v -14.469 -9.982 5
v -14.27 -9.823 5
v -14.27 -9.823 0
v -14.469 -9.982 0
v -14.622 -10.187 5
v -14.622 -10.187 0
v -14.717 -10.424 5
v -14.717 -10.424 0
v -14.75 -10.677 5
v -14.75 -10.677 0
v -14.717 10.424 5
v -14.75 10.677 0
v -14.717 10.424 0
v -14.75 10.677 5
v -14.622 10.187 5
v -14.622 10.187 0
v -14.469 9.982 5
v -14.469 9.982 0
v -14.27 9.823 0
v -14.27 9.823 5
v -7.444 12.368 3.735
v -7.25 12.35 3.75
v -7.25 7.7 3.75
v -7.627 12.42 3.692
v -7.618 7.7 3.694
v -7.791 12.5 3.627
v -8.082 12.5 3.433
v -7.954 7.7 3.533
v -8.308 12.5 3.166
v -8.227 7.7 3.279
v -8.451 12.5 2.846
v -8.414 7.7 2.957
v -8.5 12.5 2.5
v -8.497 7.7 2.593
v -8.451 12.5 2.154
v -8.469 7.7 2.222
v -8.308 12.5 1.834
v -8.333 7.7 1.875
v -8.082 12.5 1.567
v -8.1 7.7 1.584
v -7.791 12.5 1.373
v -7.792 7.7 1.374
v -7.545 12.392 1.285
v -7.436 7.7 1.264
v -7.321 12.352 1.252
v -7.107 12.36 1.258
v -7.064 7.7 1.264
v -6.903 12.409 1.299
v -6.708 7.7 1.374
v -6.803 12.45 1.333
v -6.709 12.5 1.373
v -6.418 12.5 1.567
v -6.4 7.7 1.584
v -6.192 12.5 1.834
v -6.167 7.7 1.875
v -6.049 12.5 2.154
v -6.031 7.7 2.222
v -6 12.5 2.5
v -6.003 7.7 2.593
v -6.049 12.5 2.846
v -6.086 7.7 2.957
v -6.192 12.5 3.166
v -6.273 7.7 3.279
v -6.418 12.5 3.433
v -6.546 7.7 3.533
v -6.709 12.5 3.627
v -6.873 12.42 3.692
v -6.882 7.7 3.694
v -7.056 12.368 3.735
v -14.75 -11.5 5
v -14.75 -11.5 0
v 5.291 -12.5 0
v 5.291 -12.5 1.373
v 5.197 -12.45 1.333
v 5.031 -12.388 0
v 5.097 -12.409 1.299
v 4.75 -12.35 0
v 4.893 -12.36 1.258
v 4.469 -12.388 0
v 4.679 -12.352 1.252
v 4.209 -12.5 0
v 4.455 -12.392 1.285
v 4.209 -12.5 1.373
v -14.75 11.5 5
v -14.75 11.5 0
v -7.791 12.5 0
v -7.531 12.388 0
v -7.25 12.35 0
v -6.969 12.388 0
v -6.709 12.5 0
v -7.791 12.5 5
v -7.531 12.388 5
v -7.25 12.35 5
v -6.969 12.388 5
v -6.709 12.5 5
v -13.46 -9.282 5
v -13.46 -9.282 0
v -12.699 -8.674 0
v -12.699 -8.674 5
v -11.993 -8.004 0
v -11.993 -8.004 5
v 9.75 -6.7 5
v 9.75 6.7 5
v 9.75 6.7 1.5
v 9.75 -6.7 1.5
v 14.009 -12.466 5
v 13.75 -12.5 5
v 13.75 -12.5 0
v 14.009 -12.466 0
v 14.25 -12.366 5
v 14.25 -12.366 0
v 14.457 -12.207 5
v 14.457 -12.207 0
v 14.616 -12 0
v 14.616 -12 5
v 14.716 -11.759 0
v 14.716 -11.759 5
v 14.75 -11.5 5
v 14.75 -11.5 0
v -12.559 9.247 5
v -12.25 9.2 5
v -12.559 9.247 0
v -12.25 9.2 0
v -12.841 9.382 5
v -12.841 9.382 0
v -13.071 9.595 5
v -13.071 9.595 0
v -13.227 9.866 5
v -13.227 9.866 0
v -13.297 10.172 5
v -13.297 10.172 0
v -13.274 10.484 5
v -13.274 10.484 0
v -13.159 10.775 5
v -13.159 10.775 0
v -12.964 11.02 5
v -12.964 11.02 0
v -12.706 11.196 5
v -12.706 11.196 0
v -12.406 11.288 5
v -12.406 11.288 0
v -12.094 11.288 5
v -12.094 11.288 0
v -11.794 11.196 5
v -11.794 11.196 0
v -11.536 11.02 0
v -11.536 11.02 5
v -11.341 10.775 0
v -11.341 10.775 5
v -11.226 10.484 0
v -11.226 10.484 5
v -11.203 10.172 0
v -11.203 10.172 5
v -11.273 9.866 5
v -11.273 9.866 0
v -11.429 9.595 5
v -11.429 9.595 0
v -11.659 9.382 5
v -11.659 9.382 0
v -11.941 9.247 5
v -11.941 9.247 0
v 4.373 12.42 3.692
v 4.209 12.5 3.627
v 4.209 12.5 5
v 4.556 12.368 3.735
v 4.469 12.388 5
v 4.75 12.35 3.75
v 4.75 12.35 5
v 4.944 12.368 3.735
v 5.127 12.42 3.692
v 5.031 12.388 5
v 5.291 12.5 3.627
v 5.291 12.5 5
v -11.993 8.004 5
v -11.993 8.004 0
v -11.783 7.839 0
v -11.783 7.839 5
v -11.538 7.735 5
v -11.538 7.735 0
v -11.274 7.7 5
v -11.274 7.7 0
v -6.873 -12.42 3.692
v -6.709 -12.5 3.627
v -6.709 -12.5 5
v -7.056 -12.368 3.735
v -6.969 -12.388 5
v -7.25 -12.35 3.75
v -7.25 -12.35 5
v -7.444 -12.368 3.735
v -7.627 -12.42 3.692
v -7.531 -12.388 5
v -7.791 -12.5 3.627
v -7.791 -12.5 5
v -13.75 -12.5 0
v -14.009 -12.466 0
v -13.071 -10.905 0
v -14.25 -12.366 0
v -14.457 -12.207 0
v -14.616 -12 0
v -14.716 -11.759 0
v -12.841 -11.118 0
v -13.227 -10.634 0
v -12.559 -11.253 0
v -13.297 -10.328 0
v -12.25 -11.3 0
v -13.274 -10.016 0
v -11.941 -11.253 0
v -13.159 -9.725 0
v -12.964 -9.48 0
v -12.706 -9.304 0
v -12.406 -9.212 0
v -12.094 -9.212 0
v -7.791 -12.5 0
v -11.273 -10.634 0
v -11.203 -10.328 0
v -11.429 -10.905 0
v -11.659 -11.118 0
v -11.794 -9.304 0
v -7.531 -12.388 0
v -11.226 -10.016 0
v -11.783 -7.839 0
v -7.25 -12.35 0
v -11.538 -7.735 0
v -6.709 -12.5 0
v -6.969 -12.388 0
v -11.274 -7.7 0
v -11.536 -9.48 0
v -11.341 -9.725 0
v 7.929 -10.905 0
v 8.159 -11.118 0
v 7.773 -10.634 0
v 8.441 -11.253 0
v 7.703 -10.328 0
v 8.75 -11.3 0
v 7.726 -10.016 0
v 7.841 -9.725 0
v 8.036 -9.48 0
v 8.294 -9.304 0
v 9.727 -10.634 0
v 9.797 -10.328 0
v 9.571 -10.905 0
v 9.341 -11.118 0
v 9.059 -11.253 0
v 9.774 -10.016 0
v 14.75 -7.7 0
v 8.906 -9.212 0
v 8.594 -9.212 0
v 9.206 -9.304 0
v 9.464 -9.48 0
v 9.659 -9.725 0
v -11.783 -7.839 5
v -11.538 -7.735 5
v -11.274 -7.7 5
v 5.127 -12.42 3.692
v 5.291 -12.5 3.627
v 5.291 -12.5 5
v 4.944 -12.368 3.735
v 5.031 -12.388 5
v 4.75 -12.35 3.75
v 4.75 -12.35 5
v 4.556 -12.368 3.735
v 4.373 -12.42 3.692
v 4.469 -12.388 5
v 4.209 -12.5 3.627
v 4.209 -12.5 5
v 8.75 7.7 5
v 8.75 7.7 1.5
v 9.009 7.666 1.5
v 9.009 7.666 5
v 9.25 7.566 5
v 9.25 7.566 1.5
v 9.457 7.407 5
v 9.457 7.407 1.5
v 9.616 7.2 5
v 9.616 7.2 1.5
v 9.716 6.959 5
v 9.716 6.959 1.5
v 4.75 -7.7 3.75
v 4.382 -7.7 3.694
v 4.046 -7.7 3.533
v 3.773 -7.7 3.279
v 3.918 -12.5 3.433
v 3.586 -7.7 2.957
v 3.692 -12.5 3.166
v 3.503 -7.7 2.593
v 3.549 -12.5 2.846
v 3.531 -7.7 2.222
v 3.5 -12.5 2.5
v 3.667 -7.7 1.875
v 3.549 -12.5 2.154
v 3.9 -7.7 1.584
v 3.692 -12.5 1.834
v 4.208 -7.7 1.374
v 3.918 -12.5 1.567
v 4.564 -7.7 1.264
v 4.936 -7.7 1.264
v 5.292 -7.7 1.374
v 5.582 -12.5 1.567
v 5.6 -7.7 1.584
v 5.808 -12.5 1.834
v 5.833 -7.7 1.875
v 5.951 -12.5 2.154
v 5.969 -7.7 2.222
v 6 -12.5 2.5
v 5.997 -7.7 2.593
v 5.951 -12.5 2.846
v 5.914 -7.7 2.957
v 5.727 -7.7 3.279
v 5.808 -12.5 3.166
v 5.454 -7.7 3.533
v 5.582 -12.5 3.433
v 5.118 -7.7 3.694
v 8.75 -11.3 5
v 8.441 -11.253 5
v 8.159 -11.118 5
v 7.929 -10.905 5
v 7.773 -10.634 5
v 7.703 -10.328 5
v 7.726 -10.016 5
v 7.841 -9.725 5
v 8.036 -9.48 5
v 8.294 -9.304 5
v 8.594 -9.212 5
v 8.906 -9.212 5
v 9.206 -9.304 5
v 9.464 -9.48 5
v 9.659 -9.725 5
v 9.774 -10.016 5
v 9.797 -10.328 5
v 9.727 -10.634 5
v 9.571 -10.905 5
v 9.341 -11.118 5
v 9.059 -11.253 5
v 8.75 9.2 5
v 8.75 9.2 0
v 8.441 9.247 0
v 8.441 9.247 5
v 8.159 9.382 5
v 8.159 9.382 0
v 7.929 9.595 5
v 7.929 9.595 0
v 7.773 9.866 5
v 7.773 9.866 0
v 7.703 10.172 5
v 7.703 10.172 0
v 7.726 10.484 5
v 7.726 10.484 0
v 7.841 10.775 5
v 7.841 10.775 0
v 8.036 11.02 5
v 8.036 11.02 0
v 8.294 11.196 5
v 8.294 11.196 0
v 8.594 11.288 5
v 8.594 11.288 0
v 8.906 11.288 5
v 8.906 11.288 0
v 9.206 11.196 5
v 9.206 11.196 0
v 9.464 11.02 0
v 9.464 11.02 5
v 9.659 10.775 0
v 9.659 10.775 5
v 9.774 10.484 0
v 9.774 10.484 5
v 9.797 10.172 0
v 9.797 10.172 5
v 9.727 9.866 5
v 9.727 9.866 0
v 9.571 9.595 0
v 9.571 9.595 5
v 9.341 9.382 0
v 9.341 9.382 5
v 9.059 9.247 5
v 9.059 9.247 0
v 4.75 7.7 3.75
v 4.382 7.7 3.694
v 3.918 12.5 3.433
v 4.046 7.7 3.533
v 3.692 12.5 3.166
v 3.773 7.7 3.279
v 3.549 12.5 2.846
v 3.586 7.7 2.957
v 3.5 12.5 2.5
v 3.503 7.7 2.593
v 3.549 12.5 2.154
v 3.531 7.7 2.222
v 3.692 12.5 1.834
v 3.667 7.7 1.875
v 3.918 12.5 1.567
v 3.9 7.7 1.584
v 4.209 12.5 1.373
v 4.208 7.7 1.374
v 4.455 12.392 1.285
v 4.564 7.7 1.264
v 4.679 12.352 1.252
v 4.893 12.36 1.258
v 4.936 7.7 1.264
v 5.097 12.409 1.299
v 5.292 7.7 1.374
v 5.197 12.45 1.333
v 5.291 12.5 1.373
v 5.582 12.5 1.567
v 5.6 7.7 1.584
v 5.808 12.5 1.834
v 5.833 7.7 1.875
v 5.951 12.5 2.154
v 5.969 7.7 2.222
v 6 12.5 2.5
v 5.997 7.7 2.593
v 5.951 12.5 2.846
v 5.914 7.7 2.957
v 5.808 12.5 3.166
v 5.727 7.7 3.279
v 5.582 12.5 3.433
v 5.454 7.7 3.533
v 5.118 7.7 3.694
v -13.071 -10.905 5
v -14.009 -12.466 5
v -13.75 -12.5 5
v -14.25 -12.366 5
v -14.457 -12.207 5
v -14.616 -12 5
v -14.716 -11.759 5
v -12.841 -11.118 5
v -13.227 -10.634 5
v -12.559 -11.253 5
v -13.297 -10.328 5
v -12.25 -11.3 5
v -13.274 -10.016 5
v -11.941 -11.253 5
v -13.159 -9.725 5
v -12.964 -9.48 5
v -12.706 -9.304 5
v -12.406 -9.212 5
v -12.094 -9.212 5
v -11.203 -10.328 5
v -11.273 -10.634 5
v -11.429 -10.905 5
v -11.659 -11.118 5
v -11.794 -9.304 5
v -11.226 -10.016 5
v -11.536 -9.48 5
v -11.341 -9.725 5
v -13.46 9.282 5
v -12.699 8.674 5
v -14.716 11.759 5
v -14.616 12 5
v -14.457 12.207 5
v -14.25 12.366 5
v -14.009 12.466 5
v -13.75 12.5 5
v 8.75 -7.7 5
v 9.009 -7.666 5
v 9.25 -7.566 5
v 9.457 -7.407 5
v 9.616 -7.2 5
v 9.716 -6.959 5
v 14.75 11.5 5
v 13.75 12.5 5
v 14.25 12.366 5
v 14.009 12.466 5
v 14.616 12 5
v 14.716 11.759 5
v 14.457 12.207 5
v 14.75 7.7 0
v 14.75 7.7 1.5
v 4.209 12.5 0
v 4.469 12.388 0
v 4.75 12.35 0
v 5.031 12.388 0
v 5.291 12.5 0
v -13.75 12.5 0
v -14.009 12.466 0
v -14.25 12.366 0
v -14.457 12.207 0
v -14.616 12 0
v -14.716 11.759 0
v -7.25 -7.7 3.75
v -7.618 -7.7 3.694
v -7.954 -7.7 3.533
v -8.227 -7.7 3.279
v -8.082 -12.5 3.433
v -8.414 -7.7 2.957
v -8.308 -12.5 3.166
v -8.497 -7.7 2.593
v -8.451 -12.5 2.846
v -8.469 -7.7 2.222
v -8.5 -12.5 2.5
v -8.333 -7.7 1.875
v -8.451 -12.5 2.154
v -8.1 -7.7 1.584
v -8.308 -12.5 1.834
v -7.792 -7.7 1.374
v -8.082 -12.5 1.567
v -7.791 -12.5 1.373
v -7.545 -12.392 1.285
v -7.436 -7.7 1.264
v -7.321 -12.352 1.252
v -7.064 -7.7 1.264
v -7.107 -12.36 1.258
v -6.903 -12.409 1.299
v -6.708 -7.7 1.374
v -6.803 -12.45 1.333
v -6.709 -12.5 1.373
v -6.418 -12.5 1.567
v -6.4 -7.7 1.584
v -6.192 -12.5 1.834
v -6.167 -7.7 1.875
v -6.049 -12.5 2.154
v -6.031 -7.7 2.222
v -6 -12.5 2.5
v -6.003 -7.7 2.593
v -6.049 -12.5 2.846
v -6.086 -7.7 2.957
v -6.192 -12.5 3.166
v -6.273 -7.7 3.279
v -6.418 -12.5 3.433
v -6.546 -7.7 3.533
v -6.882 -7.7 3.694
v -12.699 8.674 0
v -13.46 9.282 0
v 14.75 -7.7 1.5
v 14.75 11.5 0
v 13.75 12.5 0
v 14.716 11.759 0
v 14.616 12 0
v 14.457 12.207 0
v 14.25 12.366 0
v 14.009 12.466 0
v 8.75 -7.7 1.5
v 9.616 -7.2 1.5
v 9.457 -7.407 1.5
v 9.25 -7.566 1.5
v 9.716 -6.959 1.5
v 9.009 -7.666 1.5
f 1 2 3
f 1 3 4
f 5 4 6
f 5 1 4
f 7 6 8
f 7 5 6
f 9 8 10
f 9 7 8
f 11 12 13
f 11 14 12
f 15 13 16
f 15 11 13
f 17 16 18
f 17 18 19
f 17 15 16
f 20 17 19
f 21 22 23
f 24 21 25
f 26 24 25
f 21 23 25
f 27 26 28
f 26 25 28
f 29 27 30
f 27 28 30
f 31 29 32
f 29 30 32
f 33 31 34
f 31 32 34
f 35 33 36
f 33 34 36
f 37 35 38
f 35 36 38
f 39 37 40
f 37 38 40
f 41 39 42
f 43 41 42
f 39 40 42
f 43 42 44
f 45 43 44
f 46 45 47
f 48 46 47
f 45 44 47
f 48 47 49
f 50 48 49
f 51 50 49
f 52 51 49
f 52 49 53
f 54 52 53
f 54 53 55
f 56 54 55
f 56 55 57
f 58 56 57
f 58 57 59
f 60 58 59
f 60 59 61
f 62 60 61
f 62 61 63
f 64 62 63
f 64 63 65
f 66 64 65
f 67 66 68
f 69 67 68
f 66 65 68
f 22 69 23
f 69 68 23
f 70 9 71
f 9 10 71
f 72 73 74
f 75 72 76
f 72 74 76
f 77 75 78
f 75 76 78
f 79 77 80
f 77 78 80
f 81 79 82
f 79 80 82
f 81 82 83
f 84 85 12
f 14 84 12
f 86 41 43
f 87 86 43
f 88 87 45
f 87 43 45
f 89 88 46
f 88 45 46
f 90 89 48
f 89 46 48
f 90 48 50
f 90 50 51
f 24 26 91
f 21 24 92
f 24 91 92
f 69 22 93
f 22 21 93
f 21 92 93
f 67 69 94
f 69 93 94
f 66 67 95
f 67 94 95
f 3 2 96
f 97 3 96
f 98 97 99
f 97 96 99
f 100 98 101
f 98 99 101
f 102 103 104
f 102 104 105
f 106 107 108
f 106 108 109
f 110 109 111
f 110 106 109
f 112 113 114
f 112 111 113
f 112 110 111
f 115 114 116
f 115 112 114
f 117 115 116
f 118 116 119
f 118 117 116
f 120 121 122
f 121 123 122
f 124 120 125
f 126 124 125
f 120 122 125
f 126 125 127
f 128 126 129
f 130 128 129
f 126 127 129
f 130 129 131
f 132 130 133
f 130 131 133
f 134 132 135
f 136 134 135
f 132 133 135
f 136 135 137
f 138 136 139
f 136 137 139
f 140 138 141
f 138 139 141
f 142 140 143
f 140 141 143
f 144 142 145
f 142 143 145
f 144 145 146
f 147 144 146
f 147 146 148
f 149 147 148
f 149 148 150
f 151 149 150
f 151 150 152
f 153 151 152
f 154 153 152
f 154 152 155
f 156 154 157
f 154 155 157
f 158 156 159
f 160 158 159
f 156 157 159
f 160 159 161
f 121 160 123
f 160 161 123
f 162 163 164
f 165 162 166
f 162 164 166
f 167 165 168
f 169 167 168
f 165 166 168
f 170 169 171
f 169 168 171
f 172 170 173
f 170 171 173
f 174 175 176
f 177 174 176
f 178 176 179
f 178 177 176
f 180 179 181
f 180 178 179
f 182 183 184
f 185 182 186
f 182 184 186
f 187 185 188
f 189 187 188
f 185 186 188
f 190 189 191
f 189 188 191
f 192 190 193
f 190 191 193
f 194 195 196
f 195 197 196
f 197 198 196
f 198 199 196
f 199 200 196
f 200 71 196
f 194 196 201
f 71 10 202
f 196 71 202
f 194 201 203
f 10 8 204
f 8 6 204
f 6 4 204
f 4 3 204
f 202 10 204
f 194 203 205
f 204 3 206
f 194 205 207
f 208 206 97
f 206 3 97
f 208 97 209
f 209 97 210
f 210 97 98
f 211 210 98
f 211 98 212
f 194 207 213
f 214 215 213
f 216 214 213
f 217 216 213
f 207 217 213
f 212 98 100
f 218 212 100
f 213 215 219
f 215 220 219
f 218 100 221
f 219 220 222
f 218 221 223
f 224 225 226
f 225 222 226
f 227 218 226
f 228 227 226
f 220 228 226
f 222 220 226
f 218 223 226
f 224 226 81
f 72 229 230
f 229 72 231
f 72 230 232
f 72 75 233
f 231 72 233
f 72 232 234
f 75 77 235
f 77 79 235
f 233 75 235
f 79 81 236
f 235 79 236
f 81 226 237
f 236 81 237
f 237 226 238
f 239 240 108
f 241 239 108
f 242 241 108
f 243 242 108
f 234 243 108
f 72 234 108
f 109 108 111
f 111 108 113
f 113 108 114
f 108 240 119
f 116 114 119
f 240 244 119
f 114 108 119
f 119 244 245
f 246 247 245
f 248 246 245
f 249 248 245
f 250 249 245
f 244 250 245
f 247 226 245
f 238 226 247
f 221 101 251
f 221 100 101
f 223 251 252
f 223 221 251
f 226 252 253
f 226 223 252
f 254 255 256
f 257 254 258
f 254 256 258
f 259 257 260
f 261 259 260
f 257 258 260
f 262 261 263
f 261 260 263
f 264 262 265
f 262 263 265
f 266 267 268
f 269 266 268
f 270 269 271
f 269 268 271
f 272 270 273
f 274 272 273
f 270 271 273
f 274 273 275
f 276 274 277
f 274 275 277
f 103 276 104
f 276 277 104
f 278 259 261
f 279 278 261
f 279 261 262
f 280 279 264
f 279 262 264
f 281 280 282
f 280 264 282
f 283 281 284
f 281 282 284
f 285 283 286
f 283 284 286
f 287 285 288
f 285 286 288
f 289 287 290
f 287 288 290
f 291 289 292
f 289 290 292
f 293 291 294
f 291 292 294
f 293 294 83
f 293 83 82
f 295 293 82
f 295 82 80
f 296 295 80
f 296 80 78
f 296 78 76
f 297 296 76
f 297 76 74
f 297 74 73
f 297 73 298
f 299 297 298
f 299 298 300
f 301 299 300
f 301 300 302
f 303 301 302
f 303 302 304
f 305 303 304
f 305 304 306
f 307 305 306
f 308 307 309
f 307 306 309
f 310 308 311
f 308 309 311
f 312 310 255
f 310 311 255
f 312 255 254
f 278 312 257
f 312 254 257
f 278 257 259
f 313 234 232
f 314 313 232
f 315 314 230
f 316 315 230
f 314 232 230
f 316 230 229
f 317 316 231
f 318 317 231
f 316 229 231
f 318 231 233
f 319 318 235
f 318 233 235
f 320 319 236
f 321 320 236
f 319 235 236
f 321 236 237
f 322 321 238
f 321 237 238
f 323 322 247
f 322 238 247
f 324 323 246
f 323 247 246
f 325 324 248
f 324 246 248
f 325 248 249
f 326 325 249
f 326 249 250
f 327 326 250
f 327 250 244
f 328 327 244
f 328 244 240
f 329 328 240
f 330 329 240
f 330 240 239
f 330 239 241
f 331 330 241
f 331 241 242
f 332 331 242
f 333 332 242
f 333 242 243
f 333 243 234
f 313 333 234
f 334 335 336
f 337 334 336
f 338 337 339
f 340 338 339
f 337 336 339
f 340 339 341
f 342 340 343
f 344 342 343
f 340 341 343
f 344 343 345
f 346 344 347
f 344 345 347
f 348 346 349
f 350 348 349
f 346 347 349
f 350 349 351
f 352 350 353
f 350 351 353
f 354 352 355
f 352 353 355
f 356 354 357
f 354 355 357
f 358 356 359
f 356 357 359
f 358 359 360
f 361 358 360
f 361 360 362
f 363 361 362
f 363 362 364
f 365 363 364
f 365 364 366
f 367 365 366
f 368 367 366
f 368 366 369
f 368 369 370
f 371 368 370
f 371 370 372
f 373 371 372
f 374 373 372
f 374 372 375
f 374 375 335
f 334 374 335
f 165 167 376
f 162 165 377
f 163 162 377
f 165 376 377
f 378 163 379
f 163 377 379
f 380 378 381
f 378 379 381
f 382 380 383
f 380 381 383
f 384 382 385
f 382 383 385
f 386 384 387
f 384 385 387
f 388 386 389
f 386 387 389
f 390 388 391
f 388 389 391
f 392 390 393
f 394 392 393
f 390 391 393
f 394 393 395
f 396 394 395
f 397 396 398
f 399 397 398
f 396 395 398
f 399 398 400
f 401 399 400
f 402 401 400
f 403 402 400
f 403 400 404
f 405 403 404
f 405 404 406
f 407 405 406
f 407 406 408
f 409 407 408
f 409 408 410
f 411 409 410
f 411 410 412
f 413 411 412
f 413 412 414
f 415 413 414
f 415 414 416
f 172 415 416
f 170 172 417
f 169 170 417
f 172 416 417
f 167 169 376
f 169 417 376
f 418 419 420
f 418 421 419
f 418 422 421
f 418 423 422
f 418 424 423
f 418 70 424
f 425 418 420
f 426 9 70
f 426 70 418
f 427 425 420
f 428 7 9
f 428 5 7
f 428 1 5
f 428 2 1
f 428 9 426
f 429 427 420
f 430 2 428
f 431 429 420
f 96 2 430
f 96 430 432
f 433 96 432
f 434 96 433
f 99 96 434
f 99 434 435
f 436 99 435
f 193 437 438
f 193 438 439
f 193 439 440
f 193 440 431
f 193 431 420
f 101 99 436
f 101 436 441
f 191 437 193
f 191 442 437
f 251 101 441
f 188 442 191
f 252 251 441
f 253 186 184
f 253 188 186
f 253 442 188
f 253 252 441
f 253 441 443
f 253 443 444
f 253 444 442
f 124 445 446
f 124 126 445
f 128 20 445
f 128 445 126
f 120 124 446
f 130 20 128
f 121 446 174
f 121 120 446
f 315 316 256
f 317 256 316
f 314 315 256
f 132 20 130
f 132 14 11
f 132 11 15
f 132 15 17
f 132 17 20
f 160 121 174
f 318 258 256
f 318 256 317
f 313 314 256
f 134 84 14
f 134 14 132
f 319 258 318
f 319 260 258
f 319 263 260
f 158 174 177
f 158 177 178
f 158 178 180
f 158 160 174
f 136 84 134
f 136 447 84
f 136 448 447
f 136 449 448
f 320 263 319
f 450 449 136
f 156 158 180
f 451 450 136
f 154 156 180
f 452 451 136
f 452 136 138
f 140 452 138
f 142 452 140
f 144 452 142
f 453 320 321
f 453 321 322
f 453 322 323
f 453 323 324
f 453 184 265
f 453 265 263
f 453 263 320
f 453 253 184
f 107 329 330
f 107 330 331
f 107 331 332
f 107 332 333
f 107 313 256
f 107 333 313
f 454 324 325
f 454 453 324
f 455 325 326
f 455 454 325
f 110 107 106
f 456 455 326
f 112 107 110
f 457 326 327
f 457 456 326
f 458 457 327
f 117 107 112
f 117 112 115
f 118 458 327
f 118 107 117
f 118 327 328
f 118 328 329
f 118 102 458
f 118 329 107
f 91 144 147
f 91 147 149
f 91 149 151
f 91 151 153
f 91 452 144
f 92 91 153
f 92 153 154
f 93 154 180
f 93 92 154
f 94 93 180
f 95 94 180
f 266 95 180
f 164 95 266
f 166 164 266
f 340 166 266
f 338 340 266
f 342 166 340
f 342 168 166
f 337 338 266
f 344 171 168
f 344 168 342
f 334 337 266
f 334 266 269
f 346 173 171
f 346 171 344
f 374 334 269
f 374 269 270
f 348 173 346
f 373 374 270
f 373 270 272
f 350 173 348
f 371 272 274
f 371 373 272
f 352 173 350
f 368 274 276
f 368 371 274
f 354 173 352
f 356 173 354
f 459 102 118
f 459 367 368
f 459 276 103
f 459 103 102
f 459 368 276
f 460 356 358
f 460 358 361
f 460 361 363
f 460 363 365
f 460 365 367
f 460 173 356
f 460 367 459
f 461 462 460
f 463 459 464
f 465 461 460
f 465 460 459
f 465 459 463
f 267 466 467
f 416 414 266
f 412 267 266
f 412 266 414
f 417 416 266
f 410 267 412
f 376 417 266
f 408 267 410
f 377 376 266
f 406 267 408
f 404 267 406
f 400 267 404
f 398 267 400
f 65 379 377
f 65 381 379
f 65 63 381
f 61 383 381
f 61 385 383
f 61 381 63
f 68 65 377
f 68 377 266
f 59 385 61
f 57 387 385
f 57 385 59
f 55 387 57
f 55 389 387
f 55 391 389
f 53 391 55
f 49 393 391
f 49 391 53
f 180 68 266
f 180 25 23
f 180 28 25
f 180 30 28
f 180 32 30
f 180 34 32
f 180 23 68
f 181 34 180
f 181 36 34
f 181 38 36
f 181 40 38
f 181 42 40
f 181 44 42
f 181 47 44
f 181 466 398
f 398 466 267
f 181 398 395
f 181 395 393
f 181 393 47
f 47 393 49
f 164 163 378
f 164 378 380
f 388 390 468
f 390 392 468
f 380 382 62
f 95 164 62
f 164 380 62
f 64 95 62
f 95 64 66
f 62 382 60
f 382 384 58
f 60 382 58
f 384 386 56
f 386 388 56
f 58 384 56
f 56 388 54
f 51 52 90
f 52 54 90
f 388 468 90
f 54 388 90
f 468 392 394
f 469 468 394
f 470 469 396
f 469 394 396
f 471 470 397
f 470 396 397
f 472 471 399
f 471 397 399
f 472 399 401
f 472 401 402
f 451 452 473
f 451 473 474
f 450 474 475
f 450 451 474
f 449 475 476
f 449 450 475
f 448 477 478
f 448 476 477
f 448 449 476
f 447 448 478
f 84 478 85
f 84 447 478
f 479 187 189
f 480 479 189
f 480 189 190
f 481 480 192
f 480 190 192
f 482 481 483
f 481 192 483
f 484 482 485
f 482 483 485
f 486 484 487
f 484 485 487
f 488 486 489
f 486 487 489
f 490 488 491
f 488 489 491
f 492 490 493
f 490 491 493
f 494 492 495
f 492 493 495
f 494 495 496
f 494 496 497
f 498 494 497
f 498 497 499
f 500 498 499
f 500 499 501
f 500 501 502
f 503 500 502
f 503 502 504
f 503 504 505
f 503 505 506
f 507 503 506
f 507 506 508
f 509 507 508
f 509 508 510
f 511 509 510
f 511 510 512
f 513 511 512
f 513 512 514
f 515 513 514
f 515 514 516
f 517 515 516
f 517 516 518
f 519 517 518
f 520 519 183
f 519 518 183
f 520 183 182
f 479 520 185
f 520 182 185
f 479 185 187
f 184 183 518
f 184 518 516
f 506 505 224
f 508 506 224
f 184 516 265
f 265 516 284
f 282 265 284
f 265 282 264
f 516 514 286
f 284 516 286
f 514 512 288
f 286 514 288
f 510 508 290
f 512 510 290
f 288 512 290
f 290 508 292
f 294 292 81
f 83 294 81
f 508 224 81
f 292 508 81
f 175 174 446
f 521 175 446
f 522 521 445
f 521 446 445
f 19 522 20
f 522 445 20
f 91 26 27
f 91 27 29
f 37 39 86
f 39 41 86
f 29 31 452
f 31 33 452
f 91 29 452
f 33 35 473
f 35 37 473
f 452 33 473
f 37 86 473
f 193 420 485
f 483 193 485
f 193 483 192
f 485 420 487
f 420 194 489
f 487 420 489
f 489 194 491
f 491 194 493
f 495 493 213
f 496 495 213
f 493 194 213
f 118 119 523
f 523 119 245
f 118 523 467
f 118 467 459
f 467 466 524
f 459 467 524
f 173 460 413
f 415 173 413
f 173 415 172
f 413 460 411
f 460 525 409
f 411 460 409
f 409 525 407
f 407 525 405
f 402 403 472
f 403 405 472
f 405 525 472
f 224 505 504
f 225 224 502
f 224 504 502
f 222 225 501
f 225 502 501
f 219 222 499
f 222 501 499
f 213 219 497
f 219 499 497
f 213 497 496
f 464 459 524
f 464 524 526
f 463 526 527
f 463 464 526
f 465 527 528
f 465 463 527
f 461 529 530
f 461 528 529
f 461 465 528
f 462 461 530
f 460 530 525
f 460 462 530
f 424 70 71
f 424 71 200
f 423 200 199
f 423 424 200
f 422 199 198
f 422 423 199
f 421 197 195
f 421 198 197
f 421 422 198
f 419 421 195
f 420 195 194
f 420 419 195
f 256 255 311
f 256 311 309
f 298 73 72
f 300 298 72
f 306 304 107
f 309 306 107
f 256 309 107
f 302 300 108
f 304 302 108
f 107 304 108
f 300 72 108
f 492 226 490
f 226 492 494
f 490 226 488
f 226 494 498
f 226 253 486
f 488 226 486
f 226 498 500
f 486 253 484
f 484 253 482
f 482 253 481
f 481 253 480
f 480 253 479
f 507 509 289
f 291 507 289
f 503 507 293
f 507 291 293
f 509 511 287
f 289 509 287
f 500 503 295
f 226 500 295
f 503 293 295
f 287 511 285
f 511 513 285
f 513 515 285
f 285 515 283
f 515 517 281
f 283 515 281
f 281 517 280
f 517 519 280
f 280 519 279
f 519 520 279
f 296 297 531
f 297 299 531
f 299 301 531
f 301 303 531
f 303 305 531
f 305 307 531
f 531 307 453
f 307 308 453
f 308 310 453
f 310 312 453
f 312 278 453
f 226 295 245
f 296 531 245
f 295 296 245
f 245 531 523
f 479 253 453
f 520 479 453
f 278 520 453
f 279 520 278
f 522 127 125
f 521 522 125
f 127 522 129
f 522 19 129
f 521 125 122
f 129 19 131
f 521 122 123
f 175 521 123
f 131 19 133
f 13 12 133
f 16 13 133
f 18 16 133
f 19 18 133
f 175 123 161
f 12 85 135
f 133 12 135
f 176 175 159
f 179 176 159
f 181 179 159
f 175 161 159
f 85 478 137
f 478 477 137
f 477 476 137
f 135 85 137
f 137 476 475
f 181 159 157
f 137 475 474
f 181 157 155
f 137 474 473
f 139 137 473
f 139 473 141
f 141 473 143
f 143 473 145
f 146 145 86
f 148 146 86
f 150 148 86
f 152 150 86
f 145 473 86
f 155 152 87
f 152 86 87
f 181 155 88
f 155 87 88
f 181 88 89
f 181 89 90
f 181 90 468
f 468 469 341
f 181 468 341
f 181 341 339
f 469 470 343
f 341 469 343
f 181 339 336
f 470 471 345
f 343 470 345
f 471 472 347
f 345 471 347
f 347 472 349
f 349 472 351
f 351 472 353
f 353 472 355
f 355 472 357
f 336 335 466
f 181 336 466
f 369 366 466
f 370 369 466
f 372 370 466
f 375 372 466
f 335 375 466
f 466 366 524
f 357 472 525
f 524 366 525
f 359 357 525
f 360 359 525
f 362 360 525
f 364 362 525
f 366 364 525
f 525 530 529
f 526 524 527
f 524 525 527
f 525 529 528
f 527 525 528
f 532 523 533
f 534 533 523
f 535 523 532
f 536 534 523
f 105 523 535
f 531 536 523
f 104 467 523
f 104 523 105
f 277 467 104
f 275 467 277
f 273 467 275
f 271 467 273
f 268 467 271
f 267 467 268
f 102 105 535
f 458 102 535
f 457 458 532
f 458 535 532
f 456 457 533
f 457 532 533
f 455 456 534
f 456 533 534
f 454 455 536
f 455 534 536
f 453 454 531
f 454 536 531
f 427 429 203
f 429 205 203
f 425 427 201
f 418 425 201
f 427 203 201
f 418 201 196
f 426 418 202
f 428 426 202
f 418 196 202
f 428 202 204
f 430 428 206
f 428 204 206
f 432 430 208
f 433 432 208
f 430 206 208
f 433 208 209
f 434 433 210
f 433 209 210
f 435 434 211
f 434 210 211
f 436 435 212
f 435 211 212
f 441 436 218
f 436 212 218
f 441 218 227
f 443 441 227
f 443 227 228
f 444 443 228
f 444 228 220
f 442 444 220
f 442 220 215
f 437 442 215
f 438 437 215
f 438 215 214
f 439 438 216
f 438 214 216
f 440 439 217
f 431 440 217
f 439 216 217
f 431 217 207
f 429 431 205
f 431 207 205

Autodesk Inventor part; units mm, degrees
ref_plane "YZ Plane" through (0, 0, 0) normal (1, 0, 0) x (0, 1, 0)
ref_plane "XZ Plane" through (0, 0, 0) normal (0, 1, 0) x (-1, 0, 0)
ref_plane "XY Plane" through (0, 0, 0) normal (0, 0, 1) x (1, 0, 0)
sketch "スケッチ1" plane through (0, 0, 0) normal (0, 0, 1) x (1, 0, 0)
  line L0 (-14.75, -12.5) -> (14.75, -12.5)
  line L1 (14.75, -12.5) -> (14.75, 12.5)
  line L2 (14.75, 12.5) -> (-14.75, 12.5)
  line L3 (-14.75, 12.5) -> (-14.75, -12.5)
  line L4 (-14.75, -12.5) -> (14.75, 12.5) construction
  line L5 (14.75, -12.5) -> (-14.75, 12.5) construction
  point P0 (0, 0)
  dimension "d0" = 29.5
  dimension "d1" = 25
extrude "プレート1" add sketch "スケッチ1" along normal blind 5
sketch "スケッチ2" plane through (0, 0, 5) normal (0, 0, 1) x (1, 0, 0)
  line L0 (-12.25, -10.25) -> (8.75, -10.25) construction
  line L1 (8.75, -10.25) -> (8.75, 10.25) construction
  line L2 (8.75, 10.25) -> (-12.25, 10.25) construction
  line L3 (-12.25, 10.25) -> (-12.25, -10.25) construction
  line L4 (-12.25, -10.25) -> (8.75, 10.25) construction
  line L5 (8.75, -10.25) -> (-12.25, 10.25) construction
  line L6 (14.75, 12.5) -> (14.75, -12.5) construction
  point P0 (0, 0)
  point P1 (-1.75, 0)
  dimension "d3" = 21
  dimension "d4" = 20.5
  dimension "d5" = 6
hole "穴1" at (-12.25, 10.25, 5) at (8.75, 10.25, 5) at (8.75, -10.25, 5) at (-12.25, -10.25, 5) direction (0, 0, -1) diameter 2.1 end through all
sketch "スケッチ3" plane through (0, 0, 0) normal (0, 0, -1) x (-1, 0, 0)
  line L0 (-14.75, -12.5) -> (-14.75, 12.5) projected
  line L1 (14.75, 12.5) -> (14.75, -12.5) projected
  line L2 (-14.75, 7.7) -> (14.75, 7.7)
  line L3 (14.75, -7.7) -> (-14.75, -7.7)
  line L4 (-14.75, 12.5) -> (14.75, 12.5) projected
  line L5 (14.75, -12.5) -> (-14.75, -12.5) projected
  point P0 (0, 0)
  dimension "d13" = 4.8
  dimension "d14" = 4.8
extrude "押し出し1" cut sketch "スケッチ3" against normal blind 1.5 contours L0 L2 L1 L3
sketch "スケッチ4" plane through (0, 0, 5) normal (0, 0, 1) x (1, 0, 0)
  line L0 (-14.75, 12.5) -> (14.75, 12.5) projected
  line L1 (14.75, -12.5) -> (-14.75, -12.5) projected
  circle A0 centre (-20.25, 0) radius 11.5
  line L2 (14.75, 12.5) -> (14.75, -12.5) projected
  line L3 (-9.25, -9.6) -> (-9.25, 9.6)
  line L4 (9.75, 9.6) -> (9.75, -9.6)
  line L5 (9.75, -9.6) -> (-9.25, 9.6) construction
  line L6 (-9.25, -9.6) -> (9.75, 9.6) construction
  line L7 (-9.25, 7.7) -> (-11.7083, 7.7)
  line L8 (-11.7083, 7.7) -> (-11.7083, -7.7)
  line L9 (-11.7083, -7.7) -> (-9.25, -7.7)
  line L10 (-9.25, -7.7) -> (-9.25, 7.7)
  line L11 (14.75, 7.7) -> (-14.75, 7.7) projected
  line L12 (14.75, 7.7) -> (-14.75, 7.7) projected
  line L13 (14.75, 7.7) -> (-14.75, 7.7) projected
  line L14 (-14.75, -7.7) -> (14.75, -7.7) projected
  line L15 (-14.75, -7.7) -> (14.75, -7.7) projected
  point P0 (0, 0)
  point P1 (14.75, 0)
  point P2 (0.25, 0)
  point P3 (-9.25, 0)
  point P4 (-11.7083, 7.7)
  point P5 (-9.25, -3.3541)
  point P6 (-9.25, 3.3541)
  point P7 (9.75, -7.7)
  point P8 (9.75, 7.7)
  dimension "d18" = 23
  dimension "d17" = 35
  dimension "d19" = 5
  dimension "d22" = 19
extrude "押し出し2" cut sketch "スケッチ4" against normal through all contours L8 A0 | L7 L3 A0 | A0 L3 L8 | A0 L3 L9 | L3 L11 L4 L14 A0 | A0 L3
fillet "フィレット1" radius 1 10 edges at (-11.7083, -7.7, 2.5) (-11.7083, 7.7, 2.5) (-14.75, -10.0995, 2.5) (-14.75, 10.0995, 2.5) (-14.75, -12.5, 2.5) (14.75, -12.5, 2.5) (14.75, 12.5, 2.5) (-14.75, 12.5, 2.5) (9.75, 7.7, 3.25) (9.75, -7.7, 3.25)
sketch "スケッチ5" plane through (0, 0, 5) normal (0, 0, 1) x (1, 0, 0)
  line L0 (-13.75, 12.5) -> (13.75, 12.5) projected
  circle A0 centre (-7.25, 13.4) radius 1.05
  circle A1 centre (4.75, 13.4) radius 1.05
  line L1 (14.75, 11.5) -> (14.75, -11.5) projected
  point P0 (0, 0)
  point P1 (-14.75, 12.5)
  point P2 (14.75, 12.5)
  point P3 (14.75, -12.5)
  dimension "d26" = 2.1
  dimension "d27" = 2.1
  dimension "d28" = 0.9
  dimension "d29" = 0.9
  dimension "d30" = 12
  dimension "d31" = 10
extrude "押し出し3" cut sketch "スケッチ5" against normal through all
sketch "スケッチ6" plane through (-6.7092, 12.5, 0) normal (0, 1, 0) x (1, 0, 0)
  line L0 (-1.0817, -5) -> (-1.0817, 0) projected
  line L1 (0, -5) -> (-1.0817, -5) projected
  line L2 (0, 0) -> (0, -5) projected
  line L3 (-1.0817, 0) -> (0, 0) projected
  line L4 (10.9183, -5) -> (10.9183, 0) projected
  line L5 (12, -5) -> (10.9183, -5) projected
  line L6 (12, 0) -> (12, -5) projected
  line L7 (10.9183, 0) -> (12, 0) projected
  line L8 (-1.5408, -3) -> (-1.5408, 0) construction
  line L9 (-1.5408, 0) -> (-1.5408, -3) construction
  line L10 (-1.0817, -2.5) -> (0, -2.5) construction
  line L11 (10.9183, -2.5) -> (12, -2.5) construction
  line L12 (11.4592, -5) -> (11.4592, 0) construction
  point P0 (6.7092, 0)
  point P1 (-0.5408, -2.5)
  point P2 (11.4592, -2.5)
hole "穴2" at (-7.25, 12.5, 2.5) at (4.75, 12.5, 2.5) direction (0, -1, 0) diameter 2.5 end through all
mirror "ミラー1" about plane through (0, 0, 0) normal (0, 1, 0) of "穴2", "押し出し3"
equation "\"d11\" = Thickness"
equation "\"d14\" = d13"
equation "\"d29\" = d28"
equation "\"d2\" = Thickness"
equation "\"BendRadius\" = Thickness"
equation "\"BendReliefWidth\" = Thickness"
equation "\"BendReliefDepth\" = 0.5 * Thickness"
equation "\"TransitionRadius\" = BendRadius"
equation "\"JacobiRadiusSize\" = BendRadius"
equation "\"GapSize\" = Thickness"
equation "\"Thickness\" = 5"
properties part number "T3.0_servo-mount_bottom_3D プリント"
